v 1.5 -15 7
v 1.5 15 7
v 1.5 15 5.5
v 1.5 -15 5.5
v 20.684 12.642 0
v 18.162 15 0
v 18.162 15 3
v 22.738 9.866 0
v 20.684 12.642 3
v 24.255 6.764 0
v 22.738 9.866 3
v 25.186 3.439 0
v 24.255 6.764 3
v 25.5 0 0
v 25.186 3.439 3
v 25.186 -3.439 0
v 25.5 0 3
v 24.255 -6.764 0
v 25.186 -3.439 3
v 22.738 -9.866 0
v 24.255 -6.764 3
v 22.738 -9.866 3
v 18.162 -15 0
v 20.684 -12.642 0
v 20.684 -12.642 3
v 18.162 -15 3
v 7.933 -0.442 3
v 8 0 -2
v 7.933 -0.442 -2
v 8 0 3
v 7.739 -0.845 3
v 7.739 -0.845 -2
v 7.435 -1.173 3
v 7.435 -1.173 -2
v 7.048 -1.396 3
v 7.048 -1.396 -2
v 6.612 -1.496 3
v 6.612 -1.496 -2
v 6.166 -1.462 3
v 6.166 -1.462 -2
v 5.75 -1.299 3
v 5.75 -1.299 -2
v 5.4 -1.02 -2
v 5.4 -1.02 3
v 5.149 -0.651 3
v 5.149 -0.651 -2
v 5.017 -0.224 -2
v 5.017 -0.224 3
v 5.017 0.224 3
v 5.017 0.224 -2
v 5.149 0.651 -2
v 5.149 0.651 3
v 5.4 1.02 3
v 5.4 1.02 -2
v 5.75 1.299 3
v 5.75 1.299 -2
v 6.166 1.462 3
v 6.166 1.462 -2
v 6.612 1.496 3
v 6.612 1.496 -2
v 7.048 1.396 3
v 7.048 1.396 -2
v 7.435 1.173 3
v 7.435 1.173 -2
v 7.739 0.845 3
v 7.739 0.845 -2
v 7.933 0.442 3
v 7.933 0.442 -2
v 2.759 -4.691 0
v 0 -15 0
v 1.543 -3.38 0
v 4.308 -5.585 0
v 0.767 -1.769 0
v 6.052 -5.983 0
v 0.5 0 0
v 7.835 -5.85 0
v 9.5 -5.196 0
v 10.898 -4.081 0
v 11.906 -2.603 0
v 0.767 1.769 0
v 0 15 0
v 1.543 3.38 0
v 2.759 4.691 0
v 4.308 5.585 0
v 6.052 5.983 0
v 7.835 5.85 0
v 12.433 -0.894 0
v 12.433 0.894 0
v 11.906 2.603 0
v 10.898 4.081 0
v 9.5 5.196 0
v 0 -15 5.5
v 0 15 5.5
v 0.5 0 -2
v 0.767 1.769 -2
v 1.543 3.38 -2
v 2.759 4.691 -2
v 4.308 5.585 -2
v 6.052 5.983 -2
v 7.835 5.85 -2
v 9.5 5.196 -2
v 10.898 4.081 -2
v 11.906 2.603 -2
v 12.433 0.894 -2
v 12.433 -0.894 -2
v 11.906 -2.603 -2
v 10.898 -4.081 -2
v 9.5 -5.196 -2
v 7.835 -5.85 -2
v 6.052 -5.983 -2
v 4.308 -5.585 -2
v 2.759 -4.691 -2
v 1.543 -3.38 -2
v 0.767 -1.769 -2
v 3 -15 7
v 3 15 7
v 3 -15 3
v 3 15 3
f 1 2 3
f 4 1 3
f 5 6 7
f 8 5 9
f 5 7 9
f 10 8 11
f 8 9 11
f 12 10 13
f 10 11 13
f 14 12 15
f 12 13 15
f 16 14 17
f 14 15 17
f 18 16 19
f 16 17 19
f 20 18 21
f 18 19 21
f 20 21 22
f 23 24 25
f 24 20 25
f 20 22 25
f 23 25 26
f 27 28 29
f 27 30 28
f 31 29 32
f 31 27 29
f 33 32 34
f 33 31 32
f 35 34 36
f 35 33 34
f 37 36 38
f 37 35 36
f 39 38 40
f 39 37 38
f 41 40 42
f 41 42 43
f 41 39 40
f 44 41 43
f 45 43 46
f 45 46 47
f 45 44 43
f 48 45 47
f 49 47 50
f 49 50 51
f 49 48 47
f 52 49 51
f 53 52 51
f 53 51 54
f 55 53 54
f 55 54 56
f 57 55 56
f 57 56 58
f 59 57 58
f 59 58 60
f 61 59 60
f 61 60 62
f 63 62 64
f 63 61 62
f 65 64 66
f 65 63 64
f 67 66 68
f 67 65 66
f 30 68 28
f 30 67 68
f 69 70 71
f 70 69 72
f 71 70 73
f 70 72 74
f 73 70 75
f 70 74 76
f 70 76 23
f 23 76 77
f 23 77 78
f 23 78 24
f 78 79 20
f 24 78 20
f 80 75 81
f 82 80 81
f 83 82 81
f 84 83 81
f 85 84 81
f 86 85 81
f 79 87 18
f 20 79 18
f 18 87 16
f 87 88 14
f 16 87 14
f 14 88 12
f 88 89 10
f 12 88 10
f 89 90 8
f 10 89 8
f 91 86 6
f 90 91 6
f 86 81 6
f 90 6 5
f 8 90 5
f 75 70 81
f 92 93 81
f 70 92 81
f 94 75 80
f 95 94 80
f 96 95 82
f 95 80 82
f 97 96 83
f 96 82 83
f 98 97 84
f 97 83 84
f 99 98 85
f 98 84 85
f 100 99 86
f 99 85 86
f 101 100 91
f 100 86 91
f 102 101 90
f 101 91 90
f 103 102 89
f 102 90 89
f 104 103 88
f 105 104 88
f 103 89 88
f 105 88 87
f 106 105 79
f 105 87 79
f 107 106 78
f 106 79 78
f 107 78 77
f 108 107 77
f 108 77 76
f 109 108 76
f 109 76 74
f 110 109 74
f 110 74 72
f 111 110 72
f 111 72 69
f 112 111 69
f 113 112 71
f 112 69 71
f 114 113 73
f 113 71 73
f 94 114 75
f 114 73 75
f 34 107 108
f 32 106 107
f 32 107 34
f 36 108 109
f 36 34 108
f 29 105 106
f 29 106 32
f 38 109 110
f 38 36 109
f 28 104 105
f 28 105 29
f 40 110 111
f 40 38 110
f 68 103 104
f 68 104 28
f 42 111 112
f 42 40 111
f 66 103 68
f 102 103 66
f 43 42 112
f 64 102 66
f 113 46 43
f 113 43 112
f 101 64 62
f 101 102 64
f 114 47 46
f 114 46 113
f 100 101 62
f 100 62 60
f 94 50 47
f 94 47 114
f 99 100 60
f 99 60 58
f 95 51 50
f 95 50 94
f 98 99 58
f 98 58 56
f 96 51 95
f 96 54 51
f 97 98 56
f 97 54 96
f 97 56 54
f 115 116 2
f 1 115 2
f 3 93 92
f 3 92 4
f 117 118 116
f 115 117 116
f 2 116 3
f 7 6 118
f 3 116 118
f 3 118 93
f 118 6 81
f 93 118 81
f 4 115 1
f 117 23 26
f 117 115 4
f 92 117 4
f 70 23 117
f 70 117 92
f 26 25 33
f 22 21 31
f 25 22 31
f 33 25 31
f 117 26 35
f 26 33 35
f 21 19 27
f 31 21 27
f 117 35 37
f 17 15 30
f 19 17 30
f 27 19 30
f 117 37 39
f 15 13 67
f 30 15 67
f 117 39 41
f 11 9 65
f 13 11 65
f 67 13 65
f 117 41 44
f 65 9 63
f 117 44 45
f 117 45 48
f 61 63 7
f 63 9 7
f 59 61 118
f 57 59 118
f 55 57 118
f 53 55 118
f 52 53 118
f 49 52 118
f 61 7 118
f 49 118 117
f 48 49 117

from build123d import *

# Parameters (mm, degrees)
EXTRU_MINCE1_DEPTH      = 15
ESQUISSE2_R             = 1.5
ENL_V_MAT_EXTRU_1_DEPTH = 32.144823005
ESQUISSE3_W             = 1.5
ESQUISSE3_H             = 1.5
ENL_V_MAT_EXTRU_2_DEPTH = 40.990623901
ESQUISSE4_R             = 6
ESQUISSE4_R_2           = 1.5
BOSS_EXTRU_1_DEPTH      = 2


with BuildPart() as part:
    # Esquisse1 → Extru.-Mince1 (new, symmetric)
    with BuildSketch(Plane(origin=(0, 0, 0), x_dir=(1, 0, 0), z_dir=(0, 1, 0))):
        Polygon((0, -7), (0, 0), (27, 0), (27, -3), (3, -3), (3, -7), align=None)
    extrude(amount=EXTRU_MINCE1_DEPTH, both=True)

    # Esquisse2 → Enlèv. mat.-Extru.1 (cut, through all)
    with BuildSketch(Plane.XY.offset(3)):
        with Locations((6.5, 0)):
            Circle(ESQUISSE2_R)
        with BuildLine():
            Line((18.16190379, -15), (27, -15))
            Line((27, -15), (27, 15))
            Line((27, 15), (18.16190379, 15))
            ThreePointArc((18.16190379, 15), (25.5, 0), (18.16190379, -15))
        make_face()
    extrude(amount=-ENL_V_MAT_EXTRU_1_DEPTH, mode=Mode.SUBTRACT)

    # Esquisse3 → Enlèv. mat.-Extru.2 (cut, through all)
    with BuildSketch(Plane(origin=(0, 15, 0), x_dir=(1, 0, 0), z_dir=(0, 1, 0))):
        with Locations((0.75, -6.25)):
            Rectangle(ESQUISSE3_W, ESQUISSE3_H)
    extrude(amount=-ENL_V_MAT_EXTRU_2_DEPTH, mode=Mode.SUBTRACT)

    # Esquisse4 → Boss.-Extru.1 (add)
    with BuildSketch(Plane(origin=(0, 0, 0), x_dir=(-1, 0, 0), z_dir=(0, 0, -1))):
        with Locations((-6.5, 0)):
            Circle(ESQUISSE4_R)
        with Locations(Location((-6.5, 0, 0), (0, 0, 180))):
            Circle(ESQUISSE4_R_2, mode=Mode.SUBTRACT)
    extrude(amount=BOSS_EXTRU_1_DEPTH)


solid = part.part
